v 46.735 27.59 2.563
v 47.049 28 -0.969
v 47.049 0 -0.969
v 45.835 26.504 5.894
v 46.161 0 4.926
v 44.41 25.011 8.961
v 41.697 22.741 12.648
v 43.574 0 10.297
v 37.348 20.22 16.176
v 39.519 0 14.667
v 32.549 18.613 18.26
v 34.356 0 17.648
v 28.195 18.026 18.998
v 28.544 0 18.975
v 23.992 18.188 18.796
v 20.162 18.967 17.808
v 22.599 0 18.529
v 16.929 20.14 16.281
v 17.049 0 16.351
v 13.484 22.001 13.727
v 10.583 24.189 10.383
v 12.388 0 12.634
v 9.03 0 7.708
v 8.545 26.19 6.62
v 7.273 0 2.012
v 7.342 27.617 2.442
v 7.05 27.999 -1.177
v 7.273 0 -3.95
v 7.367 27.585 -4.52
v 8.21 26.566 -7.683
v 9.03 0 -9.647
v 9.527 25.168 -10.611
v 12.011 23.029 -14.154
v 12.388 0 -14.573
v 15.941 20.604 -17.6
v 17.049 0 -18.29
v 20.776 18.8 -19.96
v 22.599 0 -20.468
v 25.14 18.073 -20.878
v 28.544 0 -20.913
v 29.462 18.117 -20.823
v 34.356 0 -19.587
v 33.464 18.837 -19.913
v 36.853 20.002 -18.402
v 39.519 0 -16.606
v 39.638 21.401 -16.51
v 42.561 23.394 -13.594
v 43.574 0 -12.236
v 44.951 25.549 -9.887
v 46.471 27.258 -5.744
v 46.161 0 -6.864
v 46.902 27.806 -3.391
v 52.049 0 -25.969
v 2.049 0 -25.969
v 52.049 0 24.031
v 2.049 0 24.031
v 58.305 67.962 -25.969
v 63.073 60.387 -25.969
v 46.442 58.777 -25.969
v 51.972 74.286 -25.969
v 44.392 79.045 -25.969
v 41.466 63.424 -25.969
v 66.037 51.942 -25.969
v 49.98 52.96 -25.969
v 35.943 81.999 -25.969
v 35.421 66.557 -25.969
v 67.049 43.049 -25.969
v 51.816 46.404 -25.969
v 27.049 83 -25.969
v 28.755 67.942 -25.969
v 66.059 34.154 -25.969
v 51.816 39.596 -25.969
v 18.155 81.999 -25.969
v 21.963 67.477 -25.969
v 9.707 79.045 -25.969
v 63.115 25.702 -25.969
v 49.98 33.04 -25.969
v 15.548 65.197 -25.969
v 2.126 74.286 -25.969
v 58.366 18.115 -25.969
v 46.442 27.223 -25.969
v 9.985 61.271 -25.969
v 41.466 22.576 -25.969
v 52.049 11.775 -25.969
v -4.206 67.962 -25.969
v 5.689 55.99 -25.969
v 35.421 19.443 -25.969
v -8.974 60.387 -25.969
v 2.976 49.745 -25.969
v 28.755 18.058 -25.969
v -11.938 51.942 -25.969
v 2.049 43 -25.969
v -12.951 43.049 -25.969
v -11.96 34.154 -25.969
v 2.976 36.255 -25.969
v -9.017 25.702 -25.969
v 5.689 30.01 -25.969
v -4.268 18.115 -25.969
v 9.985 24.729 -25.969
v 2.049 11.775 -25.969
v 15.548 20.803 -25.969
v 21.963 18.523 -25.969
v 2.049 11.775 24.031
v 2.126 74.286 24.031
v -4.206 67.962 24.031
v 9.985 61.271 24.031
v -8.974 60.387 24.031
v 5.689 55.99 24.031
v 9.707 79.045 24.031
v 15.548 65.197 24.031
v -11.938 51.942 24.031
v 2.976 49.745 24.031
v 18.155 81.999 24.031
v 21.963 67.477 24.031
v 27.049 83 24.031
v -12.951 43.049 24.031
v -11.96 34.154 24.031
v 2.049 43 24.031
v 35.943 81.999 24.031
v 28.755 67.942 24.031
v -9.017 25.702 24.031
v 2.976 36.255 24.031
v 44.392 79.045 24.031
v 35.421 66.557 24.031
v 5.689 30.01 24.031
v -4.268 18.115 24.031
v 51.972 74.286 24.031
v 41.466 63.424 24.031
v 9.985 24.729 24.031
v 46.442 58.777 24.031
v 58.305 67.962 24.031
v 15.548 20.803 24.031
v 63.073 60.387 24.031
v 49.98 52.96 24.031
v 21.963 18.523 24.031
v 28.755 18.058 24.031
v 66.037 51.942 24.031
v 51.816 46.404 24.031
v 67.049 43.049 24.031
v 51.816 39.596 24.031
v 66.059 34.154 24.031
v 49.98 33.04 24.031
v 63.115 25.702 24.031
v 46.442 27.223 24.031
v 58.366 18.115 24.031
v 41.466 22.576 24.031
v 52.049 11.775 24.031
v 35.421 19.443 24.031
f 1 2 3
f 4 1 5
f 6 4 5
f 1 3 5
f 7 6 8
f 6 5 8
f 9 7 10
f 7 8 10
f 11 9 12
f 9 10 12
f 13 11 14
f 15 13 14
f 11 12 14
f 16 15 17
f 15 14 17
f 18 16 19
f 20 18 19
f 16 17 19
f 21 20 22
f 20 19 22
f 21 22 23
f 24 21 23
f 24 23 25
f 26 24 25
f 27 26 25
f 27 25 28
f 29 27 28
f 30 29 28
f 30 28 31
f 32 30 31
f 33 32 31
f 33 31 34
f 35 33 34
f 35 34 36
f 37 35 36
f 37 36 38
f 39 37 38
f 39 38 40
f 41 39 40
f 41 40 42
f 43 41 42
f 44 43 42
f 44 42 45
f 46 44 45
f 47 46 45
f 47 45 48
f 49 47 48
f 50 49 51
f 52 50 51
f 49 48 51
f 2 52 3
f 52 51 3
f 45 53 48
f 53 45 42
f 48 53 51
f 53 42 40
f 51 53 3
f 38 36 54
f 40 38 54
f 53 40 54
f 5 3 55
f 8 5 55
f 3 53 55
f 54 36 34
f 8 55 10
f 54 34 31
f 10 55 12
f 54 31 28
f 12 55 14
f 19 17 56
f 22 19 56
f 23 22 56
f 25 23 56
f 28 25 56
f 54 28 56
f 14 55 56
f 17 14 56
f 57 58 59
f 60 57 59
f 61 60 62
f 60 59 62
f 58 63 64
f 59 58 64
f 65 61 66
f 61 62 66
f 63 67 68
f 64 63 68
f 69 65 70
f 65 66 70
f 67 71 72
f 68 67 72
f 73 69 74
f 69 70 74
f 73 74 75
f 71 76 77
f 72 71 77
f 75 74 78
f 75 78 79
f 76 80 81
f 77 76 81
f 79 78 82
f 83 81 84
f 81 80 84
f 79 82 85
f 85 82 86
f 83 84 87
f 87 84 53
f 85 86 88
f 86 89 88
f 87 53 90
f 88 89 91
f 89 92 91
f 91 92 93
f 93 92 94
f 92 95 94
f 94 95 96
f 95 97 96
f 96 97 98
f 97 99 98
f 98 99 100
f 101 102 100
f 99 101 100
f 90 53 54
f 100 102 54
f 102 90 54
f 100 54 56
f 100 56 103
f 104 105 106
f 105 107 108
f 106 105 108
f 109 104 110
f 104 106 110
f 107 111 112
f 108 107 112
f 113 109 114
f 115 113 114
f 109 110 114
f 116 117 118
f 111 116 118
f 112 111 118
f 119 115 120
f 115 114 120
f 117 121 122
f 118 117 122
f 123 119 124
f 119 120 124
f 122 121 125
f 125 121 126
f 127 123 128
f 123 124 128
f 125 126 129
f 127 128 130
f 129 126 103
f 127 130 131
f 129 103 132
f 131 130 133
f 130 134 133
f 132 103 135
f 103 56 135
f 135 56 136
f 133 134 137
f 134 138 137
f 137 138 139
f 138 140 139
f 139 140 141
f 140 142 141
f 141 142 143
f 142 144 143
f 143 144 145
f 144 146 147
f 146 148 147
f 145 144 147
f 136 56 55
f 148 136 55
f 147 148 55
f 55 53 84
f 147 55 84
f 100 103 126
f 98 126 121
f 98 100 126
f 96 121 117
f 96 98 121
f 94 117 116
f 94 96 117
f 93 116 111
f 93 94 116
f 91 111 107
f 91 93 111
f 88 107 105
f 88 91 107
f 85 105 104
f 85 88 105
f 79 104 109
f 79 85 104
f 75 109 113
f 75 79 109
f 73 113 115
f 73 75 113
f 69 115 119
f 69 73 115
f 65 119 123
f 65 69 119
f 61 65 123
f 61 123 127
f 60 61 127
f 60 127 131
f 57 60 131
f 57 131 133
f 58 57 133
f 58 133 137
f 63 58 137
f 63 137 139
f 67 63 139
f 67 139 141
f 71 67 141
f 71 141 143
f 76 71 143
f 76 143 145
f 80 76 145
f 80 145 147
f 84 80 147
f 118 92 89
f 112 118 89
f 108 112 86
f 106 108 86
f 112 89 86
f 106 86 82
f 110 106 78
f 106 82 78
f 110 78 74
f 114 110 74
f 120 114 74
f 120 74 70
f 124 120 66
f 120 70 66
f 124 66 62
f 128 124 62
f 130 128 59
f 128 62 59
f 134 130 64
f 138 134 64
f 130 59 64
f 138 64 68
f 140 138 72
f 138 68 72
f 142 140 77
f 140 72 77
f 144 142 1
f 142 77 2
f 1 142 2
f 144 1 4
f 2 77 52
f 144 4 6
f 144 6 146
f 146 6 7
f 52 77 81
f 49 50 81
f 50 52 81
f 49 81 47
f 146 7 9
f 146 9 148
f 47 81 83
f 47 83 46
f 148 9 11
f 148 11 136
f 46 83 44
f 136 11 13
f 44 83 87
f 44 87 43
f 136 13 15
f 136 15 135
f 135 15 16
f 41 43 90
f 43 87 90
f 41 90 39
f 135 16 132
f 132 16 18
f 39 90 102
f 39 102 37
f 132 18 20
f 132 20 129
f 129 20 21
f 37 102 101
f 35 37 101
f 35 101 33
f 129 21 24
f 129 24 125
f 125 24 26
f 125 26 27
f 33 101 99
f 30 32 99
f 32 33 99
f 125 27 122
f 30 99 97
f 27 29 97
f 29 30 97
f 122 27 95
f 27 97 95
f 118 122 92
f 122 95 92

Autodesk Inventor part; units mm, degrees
ref_plane "YZ Plane" through (0, 0, 0) normal (1, 0, 0) x (0, 1, 0)
ref_plane "XZ Plane" through (0, 0, 0) normal (0, 1, 0) x (-1, 0, 0)
ref_plane "XY Plane" through (0, 0, 0) normal (0, 0, 1) x (1, 0, 0)
sketch "Sketch1" plane through (0, 0, 0) normal (0, 1, 0) x (-1, 0, 0)
  line L0 (12.9507, 24.0308) -> (-67.0493, 24.0308)
  line L1 (-67.0493, 24.0308) -> (-67.0493, -25.9692)
  line L2 (-67.0493, -25.9692) -> (12.9507, -25.9692)
  line L3 (12.9507, -25.9692) -> (12.9507, 24.0308)
  point P0 (0, 0)
  dimension "d0" = 80
  dimension "d1" = 50
extrude "Extrusion1" add sketch "Sketch1" along normal blind 86
sketch "Sketch2" plane through (0, 0, 0) normal (0, -1, 0) x (1, 0, 0)
  circle A0 centre (27.0493, -0.9692) radius 20
  point P0 (0, 0)
  point P1 (67.0493, -25.9692)
  point P2 (-12.9507, 24.0308)
  dimension "d7" = 40
sketch "Sketch3" plane through (67.0493, 0, -25.9692) normal (0, 0, -1) x (-1, 0, 0)
  circle A0 centre (40, 43) radius 40
  circle A1 centre (40, 43) radius 25
  line L0 (0, 0) -> (15, 0)
  line L1 (0, 0) -> (80, 0) projected
  line L2 (80, 0) -> (65, 0)
  line L3 (65, 0) -> (65, 11.775)
  line L4 (15, 0) -> (15, 11.775)
  line L5 (0, 86) -> (80, 86) projected
  line L6 (0, 86) -> (80, 86)
  line L7 (80, 86) -> (80, 0)
  line L8 (80, 0) -> (0, 0)
  line L9 (0, 0) -> (0, 86)
  point P0 (67.0493, 0)
  point P1 (0, 43)
  point P2 (80, 43)
  dimension "d10" = 50
  dimension "d15" = 15
  dimension "d16" = 15
extrude "Extrusion2" cut sketch "Sketch3" against normal blind 100 contours A1
extrude "Extrusion3" cut sketch "Sketch2" against normal blind 47.6125
extrude "Extrusion4" cut sketch "Sketch3" against normal blind 100 contours L4 L0 L9 A0
extrude "Extrusion5" cut sketch "Sketch3" against normal blind 100 contours A0 L7 L1 L3
extrude "Extrusion6" cut sketch "Sketch3" against normal blind 100 contours L9 L5 L7 A0
